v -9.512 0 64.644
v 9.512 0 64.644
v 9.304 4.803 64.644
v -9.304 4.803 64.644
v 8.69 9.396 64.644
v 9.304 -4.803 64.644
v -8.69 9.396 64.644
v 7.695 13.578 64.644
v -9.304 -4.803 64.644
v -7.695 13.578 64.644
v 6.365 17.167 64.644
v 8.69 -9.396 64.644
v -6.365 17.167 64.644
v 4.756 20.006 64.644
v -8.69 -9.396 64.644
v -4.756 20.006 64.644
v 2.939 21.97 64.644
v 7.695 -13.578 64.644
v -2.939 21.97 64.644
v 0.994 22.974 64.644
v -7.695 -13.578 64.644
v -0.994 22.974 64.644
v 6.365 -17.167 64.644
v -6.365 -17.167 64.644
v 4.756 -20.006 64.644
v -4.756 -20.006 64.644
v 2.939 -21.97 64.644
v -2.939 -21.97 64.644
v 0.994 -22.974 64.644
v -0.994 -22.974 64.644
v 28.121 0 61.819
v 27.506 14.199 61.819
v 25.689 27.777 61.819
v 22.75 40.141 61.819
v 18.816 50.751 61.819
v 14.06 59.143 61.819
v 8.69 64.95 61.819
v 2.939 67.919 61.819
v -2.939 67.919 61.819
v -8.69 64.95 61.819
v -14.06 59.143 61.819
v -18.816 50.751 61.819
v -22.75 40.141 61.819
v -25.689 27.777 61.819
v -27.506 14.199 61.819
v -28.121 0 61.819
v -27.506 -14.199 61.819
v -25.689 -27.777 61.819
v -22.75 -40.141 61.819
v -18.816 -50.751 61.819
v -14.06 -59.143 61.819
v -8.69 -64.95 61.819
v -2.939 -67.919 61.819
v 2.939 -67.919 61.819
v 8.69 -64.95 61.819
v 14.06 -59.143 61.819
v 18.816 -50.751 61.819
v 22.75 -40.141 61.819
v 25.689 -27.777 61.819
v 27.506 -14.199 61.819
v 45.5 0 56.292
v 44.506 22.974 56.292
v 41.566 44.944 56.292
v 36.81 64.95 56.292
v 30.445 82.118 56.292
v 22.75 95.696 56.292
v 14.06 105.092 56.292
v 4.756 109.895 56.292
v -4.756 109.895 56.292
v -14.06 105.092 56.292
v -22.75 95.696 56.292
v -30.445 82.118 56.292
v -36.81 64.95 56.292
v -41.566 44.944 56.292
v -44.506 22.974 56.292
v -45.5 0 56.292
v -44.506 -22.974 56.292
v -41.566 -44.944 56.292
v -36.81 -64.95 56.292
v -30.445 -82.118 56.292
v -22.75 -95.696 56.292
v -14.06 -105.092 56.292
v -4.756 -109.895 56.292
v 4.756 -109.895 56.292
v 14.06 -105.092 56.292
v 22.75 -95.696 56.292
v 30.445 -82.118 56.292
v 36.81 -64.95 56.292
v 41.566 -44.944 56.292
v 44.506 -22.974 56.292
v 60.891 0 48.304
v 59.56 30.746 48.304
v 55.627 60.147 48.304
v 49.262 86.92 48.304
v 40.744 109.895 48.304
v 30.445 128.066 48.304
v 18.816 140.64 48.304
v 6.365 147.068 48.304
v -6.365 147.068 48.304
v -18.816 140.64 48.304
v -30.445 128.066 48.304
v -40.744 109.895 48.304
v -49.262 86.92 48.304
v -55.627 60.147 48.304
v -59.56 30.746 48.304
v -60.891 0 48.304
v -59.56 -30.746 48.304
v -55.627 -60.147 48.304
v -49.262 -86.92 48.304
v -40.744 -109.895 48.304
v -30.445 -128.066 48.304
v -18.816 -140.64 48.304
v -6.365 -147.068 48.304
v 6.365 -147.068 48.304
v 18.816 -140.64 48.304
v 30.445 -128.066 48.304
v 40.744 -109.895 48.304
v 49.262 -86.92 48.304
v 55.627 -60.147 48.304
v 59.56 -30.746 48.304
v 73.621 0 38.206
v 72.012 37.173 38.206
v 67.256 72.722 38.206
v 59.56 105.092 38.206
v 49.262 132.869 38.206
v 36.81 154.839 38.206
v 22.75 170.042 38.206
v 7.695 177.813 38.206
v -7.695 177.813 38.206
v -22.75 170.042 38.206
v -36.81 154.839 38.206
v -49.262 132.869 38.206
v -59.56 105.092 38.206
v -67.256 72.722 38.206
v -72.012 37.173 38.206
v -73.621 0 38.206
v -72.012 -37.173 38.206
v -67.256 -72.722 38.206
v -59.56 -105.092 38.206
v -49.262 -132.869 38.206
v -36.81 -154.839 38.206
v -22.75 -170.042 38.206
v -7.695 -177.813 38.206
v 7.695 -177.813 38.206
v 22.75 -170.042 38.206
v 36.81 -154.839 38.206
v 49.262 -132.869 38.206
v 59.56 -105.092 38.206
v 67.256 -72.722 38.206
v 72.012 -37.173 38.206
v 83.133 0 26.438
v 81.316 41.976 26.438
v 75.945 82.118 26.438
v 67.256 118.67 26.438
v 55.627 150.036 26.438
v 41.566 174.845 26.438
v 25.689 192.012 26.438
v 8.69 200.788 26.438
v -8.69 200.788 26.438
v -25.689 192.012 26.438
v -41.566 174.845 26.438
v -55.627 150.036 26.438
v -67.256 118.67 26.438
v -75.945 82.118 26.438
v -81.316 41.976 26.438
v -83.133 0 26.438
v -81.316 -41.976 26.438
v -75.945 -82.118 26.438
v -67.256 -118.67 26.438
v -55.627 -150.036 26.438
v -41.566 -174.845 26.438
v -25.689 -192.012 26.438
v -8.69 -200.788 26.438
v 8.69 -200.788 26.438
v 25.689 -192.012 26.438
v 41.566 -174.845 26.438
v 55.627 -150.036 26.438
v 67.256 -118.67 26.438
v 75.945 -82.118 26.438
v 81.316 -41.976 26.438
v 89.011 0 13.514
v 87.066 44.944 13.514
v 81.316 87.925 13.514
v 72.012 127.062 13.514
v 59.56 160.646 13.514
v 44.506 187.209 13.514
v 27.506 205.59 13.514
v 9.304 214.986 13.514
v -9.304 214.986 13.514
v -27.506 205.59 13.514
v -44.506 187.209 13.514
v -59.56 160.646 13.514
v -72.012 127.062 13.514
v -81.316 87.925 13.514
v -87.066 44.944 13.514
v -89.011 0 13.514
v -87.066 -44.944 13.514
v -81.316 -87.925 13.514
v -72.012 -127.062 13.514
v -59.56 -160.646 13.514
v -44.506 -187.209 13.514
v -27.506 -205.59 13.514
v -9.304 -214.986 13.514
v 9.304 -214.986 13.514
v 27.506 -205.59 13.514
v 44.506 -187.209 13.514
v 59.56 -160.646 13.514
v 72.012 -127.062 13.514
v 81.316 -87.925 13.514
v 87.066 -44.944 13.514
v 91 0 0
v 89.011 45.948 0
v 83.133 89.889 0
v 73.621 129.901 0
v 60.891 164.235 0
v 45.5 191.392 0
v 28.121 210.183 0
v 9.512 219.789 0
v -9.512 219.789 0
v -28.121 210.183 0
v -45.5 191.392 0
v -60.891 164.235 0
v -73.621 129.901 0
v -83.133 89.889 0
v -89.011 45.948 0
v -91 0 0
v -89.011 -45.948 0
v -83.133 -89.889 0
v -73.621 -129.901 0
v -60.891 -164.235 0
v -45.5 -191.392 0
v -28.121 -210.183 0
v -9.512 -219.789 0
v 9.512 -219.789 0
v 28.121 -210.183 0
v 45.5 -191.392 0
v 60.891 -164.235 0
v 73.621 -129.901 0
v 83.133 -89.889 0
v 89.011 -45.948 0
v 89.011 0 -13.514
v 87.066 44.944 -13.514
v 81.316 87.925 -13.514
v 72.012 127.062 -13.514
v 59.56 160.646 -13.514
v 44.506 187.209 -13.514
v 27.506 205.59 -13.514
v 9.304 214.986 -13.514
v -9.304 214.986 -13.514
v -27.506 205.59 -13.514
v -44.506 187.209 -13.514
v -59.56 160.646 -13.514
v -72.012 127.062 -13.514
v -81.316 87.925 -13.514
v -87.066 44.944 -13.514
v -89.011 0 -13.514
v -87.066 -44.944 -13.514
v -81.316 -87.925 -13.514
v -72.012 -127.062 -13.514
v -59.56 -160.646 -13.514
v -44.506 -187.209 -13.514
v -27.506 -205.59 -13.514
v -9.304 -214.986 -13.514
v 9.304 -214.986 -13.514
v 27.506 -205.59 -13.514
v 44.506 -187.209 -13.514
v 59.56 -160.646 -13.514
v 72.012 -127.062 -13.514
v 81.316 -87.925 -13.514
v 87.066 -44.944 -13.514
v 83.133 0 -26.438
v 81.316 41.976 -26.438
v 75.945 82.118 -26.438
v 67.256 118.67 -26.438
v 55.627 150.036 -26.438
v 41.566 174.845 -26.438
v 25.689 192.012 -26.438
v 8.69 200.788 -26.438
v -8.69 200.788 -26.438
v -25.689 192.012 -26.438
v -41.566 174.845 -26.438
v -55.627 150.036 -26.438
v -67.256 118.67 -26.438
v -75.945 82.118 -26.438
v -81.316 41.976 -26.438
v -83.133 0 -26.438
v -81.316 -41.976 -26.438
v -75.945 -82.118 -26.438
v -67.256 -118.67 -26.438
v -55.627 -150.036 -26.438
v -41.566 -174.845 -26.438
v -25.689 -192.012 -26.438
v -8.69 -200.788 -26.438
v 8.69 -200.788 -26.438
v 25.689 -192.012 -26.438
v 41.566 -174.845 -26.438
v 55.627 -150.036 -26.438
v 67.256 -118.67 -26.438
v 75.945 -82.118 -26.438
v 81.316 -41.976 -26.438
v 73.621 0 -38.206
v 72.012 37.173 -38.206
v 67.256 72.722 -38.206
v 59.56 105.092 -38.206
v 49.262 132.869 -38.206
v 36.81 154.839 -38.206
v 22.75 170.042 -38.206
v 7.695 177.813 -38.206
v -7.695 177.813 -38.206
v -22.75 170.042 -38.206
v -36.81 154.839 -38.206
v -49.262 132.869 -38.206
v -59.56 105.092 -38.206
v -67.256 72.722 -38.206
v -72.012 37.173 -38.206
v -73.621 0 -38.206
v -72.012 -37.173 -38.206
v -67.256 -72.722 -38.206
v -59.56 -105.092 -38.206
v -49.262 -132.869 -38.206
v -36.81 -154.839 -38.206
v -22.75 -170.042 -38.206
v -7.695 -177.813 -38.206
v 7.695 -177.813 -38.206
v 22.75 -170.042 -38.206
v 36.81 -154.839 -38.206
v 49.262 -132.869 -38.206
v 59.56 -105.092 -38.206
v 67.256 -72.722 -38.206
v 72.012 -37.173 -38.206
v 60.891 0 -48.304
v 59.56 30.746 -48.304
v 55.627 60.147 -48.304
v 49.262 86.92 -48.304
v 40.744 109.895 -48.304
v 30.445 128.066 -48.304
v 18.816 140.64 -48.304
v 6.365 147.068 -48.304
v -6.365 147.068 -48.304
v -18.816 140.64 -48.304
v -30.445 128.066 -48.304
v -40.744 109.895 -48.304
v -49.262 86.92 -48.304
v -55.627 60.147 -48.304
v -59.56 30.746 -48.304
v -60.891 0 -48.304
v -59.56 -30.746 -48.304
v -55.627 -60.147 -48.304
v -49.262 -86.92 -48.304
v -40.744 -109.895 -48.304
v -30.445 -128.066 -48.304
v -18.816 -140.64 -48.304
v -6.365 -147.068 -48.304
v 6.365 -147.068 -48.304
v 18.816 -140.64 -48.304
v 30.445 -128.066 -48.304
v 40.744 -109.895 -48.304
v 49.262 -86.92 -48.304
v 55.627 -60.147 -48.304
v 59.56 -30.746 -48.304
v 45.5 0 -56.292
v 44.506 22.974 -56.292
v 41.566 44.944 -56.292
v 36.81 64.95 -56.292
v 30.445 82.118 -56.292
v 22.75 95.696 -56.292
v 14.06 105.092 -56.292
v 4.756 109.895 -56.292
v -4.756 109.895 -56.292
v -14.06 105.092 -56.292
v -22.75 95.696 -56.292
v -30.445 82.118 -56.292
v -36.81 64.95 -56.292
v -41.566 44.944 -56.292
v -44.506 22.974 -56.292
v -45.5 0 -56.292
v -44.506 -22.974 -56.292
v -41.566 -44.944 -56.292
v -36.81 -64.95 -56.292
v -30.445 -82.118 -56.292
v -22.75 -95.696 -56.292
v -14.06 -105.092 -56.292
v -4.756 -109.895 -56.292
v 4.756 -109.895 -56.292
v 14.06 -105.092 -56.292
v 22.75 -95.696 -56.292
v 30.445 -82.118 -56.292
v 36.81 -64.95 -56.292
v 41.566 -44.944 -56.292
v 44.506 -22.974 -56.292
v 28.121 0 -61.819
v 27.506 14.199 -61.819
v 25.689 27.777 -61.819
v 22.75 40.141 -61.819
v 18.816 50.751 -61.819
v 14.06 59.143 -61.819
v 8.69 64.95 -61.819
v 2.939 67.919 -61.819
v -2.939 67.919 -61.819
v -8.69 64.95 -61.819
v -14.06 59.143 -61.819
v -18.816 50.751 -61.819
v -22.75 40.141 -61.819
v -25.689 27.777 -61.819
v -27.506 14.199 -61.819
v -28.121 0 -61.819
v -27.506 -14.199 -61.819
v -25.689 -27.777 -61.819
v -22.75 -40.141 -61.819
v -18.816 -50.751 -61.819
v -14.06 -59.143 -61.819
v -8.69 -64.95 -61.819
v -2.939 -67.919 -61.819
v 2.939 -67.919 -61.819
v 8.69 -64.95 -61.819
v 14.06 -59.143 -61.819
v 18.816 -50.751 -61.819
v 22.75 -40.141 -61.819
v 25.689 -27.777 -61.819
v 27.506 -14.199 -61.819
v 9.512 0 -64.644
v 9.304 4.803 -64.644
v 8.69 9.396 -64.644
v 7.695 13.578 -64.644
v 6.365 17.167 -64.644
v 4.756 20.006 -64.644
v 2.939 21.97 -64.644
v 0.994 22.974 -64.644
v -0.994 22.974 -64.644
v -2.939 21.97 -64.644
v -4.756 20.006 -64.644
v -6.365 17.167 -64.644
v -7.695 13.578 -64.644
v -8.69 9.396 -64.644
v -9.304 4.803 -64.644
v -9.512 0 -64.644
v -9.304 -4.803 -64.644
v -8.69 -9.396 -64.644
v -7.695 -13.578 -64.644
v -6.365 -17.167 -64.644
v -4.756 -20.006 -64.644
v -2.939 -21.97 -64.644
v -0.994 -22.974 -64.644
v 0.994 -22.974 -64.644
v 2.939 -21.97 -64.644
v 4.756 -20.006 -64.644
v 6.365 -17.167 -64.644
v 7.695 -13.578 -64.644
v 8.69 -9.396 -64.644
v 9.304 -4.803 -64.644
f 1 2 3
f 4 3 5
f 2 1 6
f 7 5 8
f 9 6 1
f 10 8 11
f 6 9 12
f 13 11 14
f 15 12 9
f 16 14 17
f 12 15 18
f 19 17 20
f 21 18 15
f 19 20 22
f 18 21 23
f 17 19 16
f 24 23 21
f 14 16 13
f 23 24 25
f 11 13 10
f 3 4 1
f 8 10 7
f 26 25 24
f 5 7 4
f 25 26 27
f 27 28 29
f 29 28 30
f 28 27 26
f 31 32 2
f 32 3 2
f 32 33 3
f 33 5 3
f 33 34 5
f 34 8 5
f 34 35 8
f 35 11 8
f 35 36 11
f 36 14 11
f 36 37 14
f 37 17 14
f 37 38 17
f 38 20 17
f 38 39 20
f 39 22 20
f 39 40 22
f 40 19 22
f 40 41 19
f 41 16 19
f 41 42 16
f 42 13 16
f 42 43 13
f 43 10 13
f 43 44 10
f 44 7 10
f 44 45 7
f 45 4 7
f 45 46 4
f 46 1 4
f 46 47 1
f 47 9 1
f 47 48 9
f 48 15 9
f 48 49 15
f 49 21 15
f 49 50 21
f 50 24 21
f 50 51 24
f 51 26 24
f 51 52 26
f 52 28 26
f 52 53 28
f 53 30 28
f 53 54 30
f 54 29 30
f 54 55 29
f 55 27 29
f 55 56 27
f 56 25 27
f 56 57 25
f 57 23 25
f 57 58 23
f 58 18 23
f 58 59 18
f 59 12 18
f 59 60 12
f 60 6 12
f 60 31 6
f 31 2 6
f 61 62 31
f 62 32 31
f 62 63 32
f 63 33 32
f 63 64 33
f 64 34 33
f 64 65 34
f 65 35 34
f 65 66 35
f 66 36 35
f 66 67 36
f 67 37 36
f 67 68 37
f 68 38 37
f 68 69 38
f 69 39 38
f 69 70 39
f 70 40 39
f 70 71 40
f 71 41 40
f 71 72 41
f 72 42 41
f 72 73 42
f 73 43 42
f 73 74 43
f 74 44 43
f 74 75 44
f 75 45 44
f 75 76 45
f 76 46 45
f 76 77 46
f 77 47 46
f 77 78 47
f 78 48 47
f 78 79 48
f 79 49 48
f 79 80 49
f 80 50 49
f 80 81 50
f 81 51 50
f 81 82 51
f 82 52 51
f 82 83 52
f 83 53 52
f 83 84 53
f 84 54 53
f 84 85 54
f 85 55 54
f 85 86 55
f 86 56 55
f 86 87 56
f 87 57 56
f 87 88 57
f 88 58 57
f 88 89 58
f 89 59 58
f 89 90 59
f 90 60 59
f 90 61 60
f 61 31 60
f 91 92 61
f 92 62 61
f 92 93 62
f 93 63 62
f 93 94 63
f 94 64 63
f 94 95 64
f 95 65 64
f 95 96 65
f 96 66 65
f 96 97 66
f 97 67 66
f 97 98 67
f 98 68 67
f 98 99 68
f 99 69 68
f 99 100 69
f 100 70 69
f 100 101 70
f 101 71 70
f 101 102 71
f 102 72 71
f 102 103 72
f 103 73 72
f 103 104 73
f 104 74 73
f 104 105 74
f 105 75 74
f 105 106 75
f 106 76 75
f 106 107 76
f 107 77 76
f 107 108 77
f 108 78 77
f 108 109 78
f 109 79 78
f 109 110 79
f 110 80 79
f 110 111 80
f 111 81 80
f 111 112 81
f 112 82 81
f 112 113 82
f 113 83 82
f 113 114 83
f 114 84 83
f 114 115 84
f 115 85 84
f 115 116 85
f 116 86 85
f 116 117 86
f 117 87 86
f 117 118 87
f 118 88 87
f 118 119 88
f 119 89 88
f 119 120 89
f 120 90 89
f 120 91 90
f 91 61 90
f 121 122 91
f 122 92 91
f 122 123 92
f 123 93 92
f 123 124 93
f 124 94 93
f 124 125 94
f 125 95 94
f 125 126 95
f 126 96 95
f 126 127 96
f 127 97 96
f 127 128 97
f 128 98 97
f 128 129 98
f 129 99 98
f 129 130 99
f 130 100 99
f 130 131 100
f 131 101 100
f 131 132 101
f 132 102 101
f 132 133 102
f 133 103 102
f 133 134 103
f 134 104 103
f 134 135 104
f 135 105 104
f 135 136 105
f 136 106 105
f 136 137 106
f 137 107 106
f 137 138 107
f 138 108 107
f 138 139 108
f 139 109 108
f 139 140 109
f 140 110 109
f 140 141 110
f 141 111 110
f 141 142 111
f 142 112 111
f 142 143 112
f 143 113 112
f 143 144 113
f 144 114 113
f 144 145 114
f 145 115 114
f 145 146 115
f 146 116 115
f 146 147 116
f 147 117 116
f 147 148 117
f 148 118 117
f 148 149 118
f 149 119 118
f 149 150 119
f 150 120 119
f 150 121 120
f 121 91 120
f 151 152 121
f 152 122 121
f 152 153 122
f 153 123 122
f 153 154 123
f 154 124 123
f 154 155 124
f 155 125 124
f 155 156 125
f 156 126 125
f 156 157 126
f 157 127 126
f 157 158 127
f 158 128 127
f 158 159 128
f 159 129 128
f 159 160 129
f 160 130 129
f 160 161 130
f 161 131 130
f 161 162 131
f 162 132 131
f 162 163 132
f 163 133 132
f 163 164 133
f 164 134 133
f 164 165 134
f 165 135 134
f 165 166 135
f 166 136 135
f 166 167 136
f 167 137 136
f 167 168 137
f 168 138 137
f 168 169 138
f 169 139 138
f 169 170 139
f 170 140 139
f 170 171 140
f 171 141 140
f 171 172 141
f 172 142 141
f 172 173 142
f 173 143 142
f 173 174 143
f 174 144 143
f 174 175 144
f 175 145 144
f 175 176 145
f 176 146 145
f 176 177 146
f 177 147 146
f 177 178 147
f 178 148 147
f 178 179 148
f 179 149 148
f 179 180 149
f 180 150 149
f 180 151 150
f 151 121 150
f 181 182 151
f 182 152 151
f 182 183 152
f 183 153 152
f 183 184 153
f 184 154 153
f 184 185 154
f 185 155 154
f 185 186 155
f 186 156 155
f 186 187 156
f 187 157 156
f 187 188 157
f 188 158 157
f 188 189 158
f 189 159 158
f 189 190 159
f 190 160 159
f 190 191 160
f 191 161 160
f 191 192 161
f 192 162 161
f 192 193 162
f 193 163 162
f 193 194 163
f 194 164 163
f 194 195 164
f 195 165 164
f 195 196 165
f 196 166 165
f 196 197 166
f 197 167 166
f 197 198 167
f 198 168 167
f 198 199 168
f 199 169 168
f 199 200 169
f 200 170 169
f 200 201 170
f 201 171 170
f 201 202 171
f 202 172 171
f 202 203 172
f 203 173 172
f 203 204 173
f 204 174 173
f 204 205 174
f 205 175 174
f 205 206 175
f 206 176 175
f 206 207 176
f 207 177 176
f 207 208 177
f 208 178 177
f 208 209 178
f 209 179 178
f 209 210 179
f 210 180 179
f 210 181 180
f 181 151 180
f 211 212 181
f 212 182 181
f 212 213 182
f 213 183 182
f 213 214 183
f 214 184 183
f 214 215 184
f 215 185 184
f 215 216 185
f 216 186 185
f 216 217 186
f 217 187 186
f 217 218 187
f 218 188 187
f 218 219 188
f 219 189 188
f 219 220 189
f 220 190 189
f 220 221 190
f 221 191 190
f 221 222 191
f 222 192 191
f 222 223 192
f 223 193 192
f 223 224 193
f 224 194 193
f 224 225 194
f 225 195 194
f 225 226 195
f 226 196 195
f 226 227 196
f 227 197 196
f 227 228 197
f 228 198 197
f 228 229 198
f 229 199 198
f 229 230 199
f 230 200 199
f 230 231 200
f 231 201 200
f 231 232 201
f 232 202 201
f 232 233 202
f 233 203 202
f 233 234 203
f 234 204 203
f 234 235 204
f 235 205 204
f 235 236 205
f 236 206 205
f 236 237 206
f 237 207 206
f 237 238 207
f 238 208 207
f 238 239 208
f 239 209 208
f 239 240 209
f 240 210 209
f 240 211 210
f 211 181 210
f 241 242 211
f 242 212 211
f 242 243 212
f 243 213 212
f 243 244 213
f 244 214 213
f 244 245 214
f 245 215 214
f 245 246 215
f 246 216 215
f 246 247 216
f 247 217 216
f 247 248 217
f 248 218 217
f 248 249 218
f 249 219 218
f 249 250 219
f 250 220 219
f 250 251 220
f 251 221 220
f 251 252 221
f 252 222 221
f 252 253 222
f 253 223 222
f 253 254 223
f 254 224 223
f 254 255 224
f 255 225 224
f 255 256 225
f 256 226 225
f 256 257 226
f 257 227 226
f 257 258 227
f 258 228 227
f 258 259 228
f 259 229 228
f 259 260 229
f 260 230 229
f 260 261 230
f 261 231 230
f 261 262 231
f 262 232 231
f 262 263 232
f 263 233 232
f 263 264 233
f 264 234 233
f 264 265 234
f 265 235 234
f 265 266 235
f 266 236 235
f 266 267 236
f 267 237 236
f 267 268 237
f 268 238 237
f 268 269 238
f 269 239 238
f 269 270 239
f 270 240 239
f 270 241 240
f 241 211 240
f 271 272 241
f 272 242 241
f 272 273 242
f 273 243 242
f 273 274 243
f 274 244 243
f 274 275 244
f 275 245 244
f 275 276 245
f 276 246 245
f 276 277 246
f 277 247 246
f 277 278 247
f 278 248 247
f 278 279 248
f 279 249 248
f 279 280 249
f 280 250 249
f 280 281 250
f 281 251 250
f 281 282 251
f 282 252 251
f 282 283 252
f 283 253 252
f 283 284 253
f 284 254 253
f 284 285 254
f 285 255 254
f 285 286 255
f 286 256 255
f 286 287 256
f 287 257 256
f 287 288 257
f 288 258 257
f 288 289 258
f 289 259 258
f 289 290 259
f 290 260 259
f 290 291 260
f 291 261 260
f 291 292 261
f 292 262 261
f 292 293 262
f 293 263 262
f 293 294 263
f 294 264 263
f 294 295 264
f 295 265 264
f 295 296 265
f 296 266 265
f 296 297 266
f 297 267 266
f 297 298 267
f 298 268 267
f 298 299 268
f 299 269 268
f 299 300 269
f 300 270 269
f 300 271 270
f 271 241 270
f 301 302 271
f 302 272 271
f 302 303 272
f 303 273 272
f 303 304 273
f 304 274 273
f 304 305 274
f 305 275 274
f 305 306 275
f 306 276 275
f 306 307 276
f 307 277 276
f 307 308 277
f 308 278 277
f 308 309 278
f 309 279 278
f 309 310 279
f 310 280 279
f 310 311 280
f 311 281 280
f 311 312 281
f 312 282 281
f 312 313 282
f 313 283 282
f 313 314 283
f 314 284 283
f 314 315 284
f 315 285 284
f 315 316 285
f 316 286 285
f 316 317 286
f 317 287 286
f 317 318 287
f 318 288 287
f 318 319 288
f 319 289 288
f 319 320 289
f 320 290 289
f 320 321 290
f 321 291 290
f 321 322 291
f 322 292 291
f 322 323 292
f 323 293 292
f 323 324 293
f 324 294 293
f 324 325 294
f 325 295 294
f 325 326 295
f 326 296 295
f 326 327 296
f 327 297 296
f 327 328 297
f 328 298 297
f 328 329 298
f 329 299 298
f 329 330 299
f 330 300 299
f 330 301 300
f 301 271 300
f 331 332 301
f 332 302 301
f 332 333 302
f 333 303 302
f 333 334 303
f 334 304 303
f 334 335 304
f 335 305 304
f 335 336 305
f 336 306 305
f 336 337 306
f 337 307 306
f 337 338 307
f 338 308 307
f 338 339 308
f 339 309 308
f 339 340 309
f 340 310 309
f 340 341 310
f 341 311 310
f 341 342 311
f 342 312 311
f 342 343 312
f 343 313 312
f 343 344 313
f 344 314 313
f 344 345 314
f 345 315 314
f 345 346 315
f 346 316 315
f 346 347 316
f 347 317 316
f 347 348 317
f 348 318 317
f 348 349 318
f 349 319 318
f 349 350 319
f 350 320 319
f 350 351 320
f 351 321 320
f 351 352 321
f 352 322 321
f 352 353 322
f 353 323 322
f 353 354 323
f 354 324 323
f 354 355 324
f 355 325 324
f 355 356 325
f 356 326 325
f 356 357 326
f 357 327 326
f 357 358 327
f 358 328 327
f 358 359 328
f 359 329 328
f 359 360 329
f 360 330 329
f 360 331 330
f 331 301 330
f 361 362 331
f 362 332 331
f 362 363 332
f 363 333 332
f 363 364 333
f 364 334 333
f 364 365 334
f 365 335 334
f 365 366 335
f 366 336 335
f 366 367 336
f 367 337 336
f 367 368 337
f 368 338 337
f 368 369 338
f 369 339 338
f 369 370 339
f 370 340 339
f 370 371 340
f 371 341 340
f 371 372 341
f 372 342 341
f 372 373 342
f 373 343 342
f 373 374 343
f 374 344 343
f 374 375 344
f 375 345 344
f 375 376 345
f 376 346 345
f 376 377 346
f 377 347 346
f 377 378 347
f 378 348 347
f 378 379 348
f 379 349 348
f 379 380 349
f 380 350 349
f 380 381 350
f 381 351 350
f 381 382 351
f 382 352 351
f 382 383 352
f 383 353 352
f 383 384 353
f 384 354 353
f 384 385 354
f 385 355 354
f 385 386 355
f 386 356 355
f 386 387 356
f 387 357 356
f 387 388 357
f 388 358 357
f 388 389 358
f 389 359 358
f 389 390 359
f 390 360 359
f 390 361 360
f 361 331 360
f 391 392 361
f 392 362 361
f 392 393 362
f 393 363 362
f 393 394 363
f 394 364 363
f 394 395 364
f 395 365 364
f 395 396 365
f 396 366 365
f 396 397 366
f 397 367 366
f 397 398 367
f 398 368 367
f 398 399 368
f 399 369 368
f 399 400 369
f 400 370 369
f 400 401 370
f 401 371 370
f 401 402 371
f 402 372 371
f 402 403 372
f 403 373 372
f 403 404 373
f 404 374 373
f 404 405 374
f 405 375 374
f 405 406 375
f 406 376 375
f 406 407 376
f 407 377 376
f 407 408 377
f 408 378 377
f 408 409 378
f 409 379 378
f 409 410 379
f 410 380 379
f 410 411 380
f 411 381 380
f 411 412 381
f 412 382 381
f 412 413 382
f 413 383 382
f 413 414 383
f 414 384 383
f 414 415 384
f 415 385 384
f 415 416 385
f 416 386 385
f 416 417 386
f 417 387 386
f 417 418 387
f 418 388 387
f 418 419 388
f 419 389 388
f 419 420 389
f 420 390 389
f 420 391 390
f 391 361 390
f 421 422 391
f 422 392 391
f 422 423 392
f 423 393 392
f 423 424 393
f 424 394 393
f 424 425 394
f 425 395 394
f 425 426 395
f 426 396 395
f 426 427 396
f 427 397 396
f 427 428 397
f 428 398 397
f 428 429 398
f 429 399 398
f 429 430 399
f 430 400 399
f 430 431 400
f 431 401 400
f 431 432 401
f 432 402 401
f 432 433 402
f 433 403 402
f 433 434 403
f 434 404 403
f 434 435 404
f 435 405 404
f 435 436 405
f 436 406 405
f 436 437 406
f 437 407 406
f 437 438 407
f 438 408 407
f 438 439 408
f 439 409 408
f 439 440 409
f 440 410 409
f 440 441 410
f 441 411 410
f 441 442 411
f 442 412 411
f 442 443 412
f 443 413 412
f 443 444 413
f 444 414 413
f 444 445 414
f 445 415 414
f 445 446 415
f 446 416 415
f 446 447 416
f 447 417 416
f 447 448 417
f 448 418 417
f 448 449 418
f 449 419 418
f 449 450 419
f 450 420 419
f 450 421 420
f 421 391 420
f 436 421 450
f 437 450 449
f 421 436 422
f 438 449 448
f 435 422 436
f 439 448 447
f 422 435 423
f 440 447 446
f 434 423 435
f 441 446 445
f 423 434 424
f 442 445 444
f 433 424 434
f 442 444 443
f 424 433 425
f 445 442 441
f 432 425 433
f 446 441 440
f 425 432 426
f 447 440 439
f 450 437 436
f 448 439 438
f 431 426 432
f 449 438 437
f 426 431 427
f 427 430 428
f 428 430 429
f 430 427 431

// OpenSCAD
// Generated by SolidPython 1.0.1 on 2020-07-29 00:46:48


scale(v = [7, 17, 5]) {
	sphere(r = 13);
}
/***********************************************
*********      SolidPython code:      **********
************************************************
 
# import packages: SolidPython
from solid import *
from solid.utils import *
from itertools import chain, combinations, permutations


class Resize:

    def __init__(self, scad_file):
        self.scad_file = scad_file
        #self.scad_file = import_scad(scad_file)
        # cone/cylinder param:
        self.r1 = 0
        self.r2 = 0
        self.h = 0
        # rectangular prism param:
        self.w = 0
        self.l = 0
        # ellipse param:
        self.r = 0

    # import OpenScad code (file name corresponds to shape)


    # classify shape + parameters
    def assign(self, param1, param2, param3):
        if self.scad_file == 'cone.scad':
            self.r1 = param1
            self.r2 = param2
            self.h = param3
        elif self.scad_file == 'cylinder.scad':
            self.r1 = param1
            self.r2 = param2
            self.h = param3
        elif self.scad_file == 'rectangularPrism.scad':
            self.h = param1
            self.l = param2
            self.w = param3
        else:
            self.r = param1
            self.h = param2

    # resize parameters
    def iterate(self):
        x = range(3, 20, 2)
        i = 1
        if self.scad_file == 'cone.scad':
            tempList = list(permutations(x, 2))
            for temp in tempList:
                param1 = temp[0]
                param2 = temp[1]
                filepath = 'produced_scad_files/' + 'cone' + str(param1) + '_' + str(param2) + '_' + '.scad'
                scad_render_to_file(cylinder(h=param1, r1=param2, r2=0), filepath)

        elif self.scad_file == 'cylinder.scad':
            tempList = list(permutations(x, 3))
            for temp in tempList:
                param1 = temp[0]
                param2 = temp[1]
                filepath = 'produced_scad_files/' + 'cylinder' + str(param1) + '_' + str(param2) + '_' + '.scad'
                scad_render_to_file(cylinder(h=param1, r1=param2, r2=param2), filepath)

        elif self.scad_file == 'rectangularPrism.scad':
            tempList = list(permutations(x, 3))
            for temp in tempList:
                param1 = temp[0]
                param2 = temp[1]
                param3 = temp[2]
                filepath = 'produced_scad_files/' + 'rectangularPrism' + str(param1) + '_' + str(param2) + '_' + str(
                    param3) + '.scad'
                scad_render_to_file(cube(size=(param1, param2, param3)), filepath)

        elif self.scad_file == 'ellipse.scad':
            tempList = list(permutations(x, 4))
            for temp in tempList:
                param1 = temp[0]
                param2 = temp[1]
                param3 = temp[2]
                param4 = temp[3]
                filepath = 'produced_scad_files/' + 'ellipse' + str(param1) + '_' + str(param2) + '_' + str(param3) + '_' + str(param4) + '.scad'
                scad_render_to_file(scale([param1, param2, param3])(sphere(r=param4)), filepath)

    def render_to_scadfile(self):
        scad_render_to_file(scad, 'example.scad') 
 
************************************************/
